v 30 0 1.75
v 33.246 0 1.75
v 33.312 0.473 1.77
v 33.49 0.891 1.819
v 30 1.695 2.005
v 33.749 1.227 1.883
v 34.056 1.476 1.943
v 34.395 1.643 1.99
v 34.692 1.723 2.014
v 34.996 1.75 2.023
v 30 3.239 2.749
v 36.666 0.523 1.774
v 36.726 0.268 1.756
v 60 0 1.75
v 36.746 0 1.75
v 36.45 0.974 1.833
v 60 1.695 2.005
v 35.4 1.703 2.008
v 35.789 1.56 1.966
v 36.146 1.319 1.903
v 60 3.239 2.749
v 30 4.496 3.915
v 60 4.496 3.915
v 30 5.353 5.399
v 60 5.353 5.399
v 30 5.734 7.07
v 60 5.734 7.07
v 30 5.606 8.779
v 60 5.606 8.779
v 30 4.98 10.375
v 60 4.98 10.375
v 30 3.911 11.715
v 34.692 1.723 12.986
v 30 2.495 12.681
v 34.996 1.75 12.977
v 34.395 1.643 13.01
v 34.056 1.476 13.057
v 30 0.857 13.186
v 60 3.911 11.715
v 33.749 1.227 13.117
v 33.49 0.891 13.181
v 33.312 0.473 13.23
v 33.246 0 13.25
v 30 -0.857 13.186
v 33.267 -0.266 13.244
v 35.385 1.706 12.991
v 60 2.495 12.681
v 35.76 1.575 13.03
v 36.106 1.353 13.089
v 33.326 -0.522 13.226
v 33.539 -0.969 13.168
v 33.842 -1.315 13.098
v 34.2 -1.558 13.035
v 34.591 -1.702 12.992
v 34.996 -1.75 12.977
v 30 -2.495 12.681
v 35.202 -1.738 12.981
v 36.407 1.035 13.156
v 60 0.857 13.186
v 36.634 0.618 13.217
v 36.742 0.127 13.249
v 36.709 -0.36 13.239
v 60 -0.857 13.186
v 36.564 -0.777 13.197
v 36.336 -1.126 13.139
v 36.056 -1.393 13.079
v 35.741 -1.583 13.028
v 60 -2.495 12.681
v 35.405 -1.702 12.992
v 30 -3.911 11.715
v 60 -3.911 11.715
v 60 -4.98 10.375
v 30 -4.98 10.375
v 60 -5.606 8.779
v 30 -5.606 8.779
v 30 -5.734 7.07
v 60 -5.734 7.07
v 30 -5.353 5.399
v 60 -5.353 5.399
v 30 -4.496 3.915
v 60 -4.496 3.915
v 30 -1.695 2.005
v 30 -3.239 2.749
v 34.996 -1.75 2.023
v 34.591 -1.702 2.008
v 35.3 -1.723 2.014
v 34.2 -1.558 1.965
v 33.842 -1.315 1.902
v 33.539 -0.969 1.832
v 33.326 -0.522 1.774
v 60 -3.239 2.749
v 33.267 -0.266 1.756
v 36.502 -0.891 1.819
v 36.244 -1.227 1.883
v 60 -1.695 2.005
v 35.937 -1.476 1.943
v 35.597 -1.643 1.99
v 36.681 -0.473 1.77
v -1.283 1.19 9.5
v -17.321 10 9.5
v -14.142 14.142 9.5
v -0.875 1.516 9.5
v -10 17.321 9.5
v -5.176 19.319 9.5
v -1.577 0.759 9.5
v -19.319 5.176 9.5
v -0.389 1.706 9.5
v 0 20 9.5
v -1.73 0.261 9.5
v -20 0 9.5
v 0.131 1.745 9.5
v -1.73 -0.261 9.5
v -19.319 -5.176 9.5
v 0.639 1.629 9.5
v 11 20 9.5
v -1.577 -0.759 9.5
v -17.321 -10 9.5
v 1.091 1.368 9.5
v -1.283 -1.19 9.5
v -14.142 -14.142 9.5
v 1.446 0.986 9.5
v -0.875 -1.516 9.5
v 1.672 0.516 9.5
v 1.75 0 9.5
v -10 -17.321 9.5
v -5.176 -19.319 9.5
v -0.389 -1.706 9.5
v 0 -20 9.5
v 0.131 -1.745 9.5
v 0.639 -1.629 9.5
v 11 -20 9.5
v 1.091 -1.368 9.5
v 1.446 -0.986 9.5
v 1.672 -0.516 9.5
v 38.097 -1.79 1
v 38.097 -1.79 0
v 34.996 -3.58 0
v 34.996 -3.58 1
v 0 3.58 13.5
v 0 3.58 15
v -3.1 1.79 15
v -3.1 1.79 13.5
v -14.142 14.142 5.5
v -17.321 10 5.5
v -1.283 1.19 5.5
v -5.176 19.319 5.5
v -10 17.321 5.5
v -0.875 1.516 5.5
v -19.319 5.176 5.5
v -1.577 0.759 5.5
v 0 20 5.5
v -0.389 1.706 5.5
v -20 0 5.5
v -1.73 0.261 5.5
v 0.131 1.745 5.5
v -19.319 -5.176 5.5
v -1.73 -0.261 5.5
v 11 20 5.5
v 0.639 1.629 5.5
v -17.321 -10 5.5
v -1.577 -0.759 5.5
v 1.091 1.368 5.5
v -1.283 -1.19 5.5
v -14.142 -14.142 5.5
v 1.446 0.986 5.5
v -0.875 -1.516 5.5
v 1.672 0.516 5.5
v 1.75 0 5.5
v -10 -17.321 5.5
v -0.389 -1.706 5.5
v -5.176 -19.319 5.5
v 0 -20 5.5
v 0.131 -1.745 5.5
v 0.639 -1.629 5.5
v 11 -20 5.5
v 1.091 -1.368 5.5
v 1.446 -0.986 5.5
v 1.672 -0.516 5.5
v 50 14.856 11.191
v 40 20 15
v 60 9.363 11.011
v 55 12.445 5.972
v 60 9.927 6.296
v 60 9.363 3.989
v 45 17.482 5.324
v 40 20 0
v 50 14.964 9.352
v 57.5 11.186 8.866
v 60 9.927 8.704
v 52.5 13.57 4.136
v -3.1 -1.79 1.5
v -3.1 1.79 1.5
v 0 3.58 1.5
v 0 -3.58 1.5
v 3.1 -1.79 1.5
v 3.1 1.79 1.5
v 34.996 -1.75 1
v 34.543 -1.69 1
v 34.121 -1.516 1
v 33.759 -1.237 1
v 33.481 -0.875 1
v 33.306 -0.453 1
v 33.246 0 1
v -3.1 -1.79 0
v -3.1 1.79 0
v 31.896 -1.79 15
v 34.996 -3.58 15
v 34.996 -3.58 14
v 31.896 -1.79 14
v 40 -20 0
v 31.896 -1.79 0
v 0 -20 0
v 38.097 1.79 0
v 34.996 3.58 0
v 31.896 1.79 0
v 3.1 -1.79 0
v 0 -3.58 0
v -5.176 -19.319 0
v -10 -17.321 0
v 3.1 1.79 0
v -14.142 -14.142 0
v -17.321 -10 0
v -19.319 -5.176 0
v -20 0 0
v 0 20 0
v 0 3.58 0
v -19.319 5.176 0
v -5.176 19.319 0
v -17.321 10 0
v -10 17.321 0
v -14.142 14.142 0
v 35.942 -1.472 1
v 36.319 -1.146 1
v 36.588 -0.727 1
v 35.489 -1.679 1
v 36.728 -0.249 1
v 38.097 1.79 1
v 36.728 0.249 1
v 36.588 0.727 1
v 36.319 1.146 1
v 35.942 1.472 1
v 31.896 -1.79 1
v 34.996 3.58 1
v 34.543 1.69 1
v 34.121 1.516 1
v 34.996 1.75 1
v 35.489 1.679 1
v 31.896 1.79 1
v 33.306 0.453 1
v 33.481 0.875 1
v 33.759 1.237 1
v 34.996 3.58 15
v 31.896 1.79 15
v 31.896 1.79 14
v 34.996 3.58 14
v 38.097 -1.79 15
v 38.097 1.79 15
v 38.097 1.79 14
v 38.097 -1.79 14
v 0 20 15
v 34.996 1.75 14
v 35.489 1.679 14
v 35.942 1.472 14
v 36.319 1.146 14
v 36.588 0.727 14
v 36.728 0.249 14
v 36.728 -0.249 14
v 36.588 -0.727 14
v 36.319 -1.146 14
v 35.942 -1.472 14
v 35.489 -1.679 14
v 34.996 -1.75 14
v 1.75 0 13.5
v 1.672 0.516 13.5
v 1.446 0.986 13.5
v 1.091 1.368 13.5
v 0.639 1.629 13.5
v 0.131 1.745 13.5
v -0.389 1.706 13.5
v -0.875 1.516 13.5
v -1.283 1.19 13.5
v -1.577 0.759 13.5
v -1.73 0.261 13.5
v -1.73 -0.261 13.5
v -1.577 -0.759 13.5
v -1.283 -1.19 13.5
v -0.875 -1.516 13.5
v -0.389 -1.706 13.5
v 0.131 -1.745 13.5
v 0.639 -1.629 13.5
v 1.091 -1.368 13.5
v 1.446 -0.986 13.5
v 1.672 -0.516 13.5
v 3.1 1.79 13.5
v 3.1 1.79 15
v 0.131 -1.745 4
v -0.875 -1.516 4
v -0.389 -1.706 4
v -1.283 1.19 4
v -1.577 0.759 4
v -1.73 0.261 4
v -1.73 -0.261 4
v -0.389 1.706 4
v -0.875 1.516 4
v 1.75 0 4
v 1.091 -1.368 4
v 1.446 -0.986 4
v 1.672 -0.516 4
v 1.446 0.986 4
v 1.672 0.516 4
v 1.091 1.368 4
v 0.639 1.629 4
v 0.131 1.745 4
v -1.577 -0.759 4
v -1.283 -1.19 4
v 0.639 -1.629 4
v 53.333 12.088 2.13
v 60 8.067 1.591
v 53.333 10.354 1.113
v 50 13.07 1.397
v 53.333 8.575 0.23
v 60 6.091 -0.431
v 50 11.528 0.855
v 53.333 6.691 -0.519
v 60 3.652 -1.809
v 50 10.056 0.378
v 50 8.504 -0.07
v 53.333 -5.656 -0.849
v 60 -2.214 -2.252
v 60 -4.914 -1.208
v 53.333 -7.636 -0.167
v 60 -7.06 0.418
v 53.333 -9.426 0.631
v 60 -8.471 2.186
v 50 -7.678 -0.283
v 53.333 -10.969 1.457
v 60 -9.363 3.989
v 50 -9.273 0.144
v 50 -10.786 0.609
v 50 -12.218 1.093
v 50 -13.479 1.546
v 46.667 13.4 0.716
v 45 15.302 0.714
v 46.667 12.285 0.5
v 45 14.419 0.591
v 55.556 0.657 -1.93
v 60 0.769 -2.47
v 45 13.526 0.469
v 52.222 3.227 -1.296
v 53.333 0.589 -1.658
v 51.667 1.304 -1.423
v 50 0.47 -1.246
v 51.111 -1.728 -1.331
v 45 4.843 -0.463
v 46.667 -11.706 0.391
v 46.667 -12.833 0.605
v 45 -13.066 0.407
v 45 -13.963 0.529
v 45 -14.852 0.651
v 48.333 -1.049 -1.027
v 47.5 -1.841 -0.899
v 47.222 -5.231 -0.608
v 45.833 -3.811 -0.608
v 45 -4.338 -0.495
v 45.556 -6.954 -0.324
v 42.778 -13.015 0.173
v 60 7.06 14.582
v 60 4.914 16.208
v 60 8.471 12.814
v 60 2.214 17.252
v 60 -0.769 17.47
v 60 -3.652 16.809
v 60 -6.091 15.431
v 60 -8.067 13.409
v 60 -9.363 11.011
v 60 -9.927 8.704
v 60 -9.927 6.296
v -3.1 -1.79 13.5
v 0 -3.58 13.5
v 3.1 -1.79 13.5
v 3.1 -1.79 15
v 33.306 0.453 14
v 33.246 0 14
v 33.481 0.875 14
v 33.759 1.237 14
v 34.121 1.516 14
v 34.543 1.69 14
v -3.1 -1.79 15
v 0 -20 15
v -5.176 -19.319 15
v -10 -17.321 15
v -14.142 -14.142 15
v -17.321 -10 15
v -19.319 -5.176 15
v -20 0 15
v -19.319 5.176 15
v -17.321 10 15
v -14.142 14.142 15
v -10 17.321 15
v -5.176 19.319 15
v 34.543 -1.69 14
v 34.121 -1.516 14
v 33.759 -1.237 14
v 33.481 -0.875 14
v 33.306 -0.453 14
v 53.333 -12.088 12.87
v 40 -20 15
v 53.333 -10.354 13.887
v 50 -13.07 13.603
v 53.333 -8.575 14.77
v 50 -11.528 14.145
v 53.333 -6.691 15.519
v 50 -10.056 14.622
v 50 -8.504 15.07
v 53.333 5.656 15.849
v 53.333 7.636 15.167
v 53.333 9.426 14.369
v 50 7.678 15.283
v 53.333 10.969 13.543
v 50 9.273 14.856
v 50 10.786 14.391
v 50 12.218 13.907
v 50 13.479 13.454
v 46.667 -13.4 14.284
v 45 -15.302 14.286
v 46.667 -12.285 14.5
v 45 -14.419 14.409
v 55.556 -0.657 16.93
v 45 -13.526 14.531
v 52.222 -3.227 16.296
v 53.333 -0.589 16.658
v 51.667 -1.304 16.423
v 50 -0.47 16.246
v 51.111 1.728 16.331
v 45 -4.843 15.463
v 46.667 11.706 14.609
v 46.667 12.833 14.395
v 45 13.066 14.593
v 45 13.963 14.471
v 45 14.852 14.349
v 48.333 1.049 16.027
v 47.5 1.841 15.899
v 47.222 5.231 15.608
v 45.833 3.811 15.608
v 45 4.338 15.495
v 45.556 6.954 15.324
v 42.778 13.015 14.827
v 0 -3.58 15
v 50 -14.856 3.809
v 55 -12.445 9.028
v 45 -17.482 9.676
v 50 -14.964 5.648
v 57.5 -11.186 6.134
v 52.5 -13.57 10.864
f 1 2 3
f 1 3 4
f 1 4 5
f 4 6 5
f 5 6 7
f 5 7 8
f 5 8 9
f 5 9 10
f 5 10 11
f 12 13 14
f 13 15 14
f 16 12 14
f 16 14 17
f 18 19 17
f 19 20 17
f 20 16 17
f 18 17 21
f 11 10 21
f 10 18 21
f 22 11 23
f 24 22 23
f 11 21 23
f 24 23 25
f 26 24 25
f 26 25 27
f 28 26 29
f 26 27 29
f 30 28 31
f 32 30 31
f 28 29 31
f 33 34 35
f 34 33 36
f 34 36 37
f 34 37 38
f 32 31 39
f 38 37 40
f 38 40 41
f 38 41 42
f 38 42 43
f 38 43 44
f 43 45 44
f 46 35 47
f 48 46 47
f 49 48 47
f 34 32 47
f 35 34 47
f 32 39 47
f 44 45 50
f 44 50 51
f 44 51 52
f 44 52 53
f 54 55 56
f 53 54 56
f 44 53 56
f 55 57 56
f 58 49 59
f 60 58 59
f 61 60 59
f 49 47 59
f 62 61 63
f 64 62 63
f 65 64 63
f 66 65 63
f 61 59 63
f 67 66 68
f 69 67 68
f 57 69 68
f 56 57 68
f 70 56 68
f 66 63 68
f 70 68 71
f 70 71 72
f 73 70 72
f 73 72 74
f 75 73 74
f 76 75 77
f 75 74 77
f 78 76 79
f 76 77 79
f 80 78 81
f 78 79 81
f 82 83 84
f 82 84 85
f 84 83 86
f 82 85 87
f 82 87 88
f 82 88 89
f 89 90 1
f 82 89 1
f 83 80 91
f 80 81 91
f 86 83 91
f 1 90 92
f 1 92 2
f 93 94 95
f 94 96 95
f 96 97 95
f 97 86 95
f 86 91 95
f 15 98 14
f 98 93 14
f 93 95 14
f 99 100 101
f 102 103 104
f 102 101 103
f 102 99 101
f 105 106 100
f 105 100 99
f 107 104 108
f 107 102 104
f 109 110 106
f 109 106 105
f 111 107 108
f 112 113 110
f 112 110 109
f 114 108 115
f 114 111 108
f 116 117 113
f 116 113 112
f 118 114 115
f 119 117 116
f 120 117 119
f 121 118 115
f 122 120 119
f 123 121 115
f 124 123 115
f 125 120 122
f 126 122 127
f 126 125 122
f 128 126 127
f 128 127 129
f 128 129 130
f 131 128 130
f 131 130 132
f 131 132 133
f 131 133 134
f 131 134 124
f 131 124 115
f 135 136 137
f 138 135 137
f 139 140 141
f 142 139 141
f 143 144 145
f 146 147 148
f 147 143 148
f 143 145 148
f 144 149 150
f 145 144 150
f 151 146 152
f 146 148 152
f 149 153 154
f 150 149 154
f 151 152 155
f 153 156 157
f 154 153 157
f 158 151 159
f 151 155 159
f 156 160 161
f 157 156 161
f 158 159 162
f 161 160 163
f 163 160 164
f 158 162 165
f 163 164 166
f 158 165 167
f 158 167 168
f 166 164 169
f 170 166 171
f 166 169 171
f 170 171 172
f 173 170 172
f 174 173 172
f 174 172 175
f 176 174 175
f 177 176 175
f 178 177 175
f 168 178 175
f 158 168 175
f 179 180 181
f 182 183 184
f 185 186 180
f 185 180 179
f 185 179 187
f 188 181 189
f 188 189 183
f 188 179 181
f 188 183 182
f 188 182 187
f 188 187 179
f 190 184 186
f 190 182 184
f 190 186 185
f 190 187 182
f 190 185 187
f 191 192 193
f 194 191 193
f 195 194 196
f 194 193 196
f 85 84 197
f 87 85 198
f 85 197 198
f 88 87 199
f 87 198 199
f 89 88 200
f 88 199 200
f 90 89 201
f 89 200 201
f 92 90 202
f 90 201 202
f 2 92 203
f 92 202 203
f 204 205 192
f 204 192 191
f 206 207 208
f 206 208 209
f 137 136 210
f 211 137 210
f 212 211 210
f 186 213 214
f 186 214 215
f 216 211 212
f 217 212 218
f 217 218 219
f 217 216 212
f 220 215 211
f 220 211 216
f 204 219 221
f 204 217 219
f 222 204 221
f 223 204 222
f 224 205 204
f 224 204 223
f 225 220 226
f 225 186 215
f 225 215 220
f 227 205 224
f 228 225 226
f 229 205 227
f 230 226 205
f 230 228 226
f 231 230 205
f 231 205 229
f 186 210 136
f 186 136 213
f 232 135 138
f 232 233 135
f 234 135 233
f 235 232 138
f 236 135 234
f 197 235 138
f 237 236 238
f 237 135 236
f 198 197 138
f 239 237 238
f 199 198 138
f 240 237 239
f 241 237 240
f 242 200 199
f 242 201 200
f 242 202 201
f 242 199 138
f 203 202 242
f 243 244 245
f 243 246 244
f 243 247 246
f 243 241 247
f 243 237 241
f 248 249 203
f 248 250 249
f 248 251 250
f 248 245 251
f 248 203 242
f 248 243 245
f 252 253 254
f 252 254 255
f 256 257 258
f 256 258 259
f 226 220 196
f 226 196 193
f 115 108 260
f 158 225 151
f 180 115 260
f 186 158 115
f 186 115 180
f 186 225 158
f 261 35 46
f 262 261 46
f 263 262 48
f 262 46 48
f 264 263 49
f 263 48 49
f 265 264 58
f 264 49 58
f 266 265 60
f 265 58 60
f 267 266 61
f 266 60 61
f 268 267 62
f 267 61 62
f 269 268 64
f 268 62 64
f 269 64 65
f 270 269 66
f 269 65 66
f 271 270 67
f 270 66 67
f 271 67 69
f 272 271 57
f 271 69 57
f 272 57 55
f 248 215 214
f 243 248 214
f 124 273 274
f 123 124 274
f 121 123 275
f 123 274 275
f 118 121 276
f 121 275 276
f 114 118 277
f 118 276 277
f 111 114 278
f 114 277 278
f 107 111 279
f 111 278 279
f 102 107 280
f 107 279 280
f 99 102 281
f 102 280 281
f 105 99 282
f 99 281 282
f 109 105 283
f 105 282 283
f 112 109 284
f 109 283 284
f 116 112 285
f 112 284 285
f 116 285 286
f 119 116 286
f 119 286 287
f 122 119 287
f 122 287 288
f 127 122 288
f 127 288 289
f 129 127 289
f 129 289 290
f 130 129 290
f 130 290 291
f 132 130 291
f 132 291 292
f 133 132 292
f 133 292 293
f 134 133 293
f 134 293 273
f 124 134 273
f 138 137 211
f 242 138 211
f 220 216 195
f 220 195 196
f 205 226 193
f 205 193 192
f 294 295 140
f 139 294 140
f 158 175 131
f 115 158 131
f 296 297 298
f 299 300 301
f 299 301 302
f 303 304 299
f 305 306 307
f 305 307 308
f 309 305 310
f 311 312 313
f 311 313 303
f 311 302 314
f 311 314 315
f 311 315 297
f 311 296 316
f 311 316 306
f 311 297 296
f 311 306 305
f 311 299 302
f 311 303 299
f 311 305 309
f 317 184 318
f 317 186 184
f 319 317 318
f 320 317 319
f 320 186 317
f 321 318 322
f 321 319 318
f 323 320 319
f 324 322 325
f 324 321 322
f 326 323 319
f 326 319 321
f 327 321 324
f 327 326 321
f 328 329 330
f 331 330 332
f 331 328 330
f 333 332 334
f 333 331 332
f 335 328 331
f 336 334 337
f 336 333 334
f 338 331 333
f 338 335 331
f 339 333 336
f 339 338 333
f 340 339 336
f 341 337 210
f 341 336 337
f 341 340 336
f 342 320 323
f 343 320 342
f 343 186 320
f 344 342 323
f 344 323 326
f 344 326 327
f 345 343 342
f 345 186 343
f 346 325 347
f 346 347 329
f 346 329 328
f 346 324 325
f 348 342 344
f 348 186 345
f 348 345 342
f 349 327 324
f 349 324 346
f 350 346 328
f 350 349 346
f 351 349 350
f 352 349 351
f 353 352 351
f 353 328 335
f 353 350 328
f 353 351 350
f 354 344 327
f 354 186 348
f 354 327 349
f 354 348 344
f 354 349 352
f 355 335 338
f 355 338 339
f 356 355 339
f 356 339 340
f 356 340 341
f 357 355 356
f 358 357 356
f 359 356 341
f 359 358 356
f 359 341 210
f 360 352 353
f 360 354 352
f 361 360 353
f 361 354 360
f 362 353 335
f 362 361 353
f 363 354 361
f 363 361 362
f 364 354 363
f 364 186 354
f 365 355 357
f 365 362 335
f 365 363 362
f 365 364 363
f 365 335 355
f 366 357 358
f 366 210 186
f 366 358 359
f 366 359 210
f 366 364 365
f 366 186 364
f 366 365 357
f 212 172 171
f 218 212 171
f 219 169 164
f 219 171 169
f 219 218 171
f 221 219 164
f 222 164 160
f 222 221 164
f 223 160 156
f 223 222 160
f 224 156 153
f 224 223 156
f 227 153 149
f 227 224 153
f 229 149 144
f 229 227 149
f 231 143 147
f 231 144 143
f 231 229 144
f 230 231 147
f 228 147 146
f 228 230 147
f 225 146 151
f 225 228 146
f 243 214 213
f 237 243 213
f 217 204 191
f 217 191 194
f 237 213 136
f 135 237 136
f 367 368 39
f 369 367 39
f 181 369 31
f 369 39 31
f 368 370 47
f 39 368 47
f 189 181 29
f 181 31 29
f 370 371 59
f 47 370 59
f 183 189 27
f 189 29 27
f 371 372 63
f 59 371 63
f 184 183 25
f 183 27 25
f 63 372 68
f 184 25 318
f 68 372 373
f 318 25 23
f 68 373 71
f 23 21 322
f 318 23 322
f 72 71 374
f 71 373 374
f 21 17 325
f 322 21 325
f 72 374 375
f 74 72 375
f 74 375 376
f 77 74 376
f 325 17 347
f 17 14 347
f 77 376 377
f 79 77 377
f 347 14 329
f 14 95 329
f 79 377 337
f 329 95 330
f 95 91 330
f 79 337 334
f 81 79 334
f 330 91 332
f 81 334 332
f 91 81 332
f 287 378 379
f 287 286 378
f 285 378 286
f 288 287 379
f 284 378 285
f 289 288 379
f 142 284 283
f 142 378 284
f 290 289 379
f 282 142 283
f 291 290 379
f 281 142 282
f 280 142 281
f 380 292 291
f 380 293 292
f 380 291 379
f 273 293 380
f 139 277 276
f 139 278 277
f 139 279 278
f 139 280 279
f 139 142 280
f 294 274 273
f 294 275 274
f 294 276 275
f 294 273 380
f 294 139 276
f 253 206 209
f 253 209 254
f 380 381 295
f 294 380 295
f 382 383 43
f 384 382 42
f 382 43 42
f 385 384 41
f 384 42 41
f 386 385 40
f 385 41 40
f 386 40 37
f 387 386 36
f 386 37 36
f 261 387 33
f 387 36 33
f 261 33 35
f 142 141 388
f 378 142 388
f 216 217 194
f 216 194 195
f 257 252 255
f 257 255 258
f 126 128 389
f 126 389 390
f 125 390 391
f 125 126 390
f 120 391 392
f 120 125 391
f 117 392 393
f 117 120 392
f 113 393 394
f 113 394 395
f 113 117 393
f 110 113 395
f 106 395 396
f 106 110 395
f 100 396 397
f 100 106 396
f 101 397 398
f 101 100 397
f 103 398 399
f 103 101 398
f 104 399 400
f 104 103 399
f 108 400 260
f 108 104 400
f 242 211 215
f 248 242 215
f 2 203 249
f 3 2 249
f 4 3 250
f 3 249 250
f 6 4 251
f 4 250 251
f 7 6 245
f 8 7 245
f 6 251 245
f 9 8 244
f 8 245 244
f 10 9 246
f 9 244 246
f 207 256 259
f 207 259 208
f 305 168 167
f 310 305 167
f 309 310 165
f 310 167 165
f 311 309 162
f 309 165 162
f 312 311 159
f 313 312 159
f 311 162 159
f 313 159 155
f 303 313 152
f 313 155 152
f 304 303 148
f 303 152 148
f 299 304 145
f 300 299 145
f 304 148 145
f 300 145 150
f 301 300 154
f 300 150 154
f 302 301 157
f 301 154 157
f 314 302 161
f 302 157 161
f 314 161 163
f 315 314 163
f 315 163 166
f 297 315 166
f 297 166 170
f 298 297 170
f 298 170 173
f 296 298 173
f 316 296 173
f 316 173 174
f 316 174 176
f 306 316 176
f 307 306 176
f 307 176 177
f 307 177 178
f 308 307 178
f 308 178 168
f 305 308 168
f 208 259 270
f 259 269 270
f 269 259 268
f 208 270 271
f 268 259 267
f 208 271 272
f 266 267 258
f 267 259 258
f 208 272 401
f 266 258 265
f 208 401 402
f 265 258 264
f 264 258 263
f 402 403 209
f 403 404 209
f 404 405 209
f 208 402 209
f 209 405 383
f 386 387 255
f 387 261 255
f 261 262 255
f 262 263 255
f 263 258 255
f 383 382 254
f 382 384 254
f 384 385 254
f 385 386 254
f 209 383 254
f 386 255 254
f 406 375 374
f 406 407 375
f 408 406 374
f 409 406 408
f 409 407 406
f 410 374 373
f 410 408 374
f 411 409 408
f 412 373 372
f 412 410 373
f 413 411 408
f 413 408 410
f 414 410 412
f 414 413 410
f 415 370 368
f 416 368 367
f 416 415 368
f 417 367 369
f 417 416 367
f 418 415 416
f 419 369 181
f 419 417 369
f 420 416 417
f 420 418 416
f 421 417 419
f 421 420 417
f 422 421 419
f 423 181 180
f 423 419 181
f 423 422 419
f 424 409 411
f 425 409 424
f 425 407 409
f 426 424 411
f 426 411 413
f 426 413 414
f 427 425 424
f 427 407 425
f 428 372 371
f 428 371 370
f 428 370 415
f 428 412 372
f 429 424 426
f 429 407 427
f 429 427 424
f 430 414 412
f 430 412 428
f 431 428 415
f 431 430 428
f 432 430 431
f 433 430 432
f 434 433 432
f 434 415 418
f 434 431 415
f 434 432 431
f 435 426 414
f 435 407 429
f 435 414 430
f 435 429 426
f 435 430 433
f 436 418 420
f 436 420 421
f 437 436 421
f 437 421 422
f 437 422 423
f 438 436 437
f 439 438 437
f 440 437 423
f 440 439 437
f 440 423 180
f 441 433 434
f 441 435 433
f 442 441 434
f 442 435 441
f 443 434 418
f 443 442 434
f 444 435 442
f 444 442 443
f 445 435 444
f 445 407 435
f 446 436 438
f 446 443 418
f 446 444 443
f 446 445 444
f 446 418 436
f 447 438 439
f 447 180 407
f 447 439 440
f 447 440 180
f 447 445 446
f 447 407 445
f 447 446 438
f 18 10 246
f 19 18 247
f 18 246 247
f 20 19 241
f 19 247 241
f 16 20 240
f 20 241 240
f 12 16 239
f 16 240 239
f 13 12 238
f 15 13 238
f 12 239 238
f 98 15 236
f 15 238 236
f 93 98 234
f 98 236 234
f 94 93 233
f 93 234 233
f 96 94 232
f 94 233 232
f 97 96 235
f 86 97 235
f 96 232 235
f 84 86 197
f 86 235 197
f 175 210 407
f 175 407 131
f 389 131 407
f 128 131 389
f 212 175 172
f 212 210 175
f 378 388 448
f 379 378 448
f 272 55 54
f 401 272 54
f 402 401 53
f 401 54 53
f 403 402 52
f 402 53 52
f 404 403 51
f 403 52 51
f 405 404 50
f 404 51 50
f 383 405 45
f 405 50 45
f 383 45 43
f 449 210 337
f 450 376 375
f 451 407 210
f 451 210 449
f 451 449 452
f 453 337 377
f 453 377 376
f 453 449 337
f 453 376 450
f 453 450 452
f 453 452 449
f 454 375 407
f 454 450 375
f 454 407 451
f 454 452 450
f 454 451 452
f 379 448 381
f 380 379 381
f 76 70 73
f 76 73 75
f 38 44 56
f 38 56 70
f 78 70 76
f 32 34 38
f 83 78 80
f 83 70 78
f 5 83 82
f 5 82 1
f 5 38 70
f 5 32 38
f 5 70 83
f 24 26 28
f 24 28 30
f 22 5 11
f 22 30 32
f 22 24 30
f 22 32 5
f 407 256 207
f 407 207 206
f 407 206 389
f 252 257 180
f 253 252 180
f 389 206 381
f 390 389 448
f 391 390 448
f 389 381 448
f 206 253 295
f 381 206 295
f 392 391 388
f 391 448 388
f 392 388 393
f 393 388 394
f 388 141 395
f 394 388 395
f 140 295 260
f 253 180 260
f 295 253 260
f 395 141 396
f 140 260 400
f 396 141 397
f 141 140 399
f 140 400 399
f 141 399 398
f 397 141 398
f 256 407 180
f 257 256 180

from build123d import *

# Parameters (mm, degrees)
BOSS_EXTRUDE1_DEPTH = 15
CUT_EXTRUDE1_DEPTH  = 1.5
SKETCH3_R           = 1.75
CUT_EXTRUDE2_DEPTH  = 9.5
SKETCH5_W           = 31
SKETCH5_H           = 4
CUT_EXTRUDE3_DEPTH  = 54.5
SKETCH9_R           = 5.75
CUT_EXTRUDE6_DEPTH  = 30
CUT_EXTRUDE7_DEPTH  = 1
CUT_EXTRUDE8_DEPTH  = 36


with BuildPart() as part:
    # Sketch1 → Boss-Extrude1 (new body)
    with BuildSketch(Plane.XY):
        with BuildLine():
            Line((0, 20), (40, 20))
            Line((40, 20), (40, -20))
            Line((40, -20), (0, -20))
            ThreePointArc((0, -20), (-20, 0), (0, 20))
        make_face()
    extrude(amount=BOSS_EXTRUDE1_DEPTH)

    # Sketch2 → Cut-Extrude1 (cut)
    with BuildSketch(Plane.XY.offset(15)):
        Polygon((0, 3.58), (-3.100370946, 1.79), (-3.100370946, -1.79), (0, -3.58), (3.100370946, -1.79), (3.100370946, 1.79), align=None)
    cut_extrude1 = extrude(amount=-CUT_EXTRUDE1_DEPTH, mode=Mode.SUBTRACT)

    # Mirror1: Cut-Extrude1 across plane
    add(cut_extrude1.mirror(Plane.XY.offset(7.5)), mode=Mode.SUBTRACT)

    # Sketch3 → Cut-Extrude2 (cut)
    with BuildSketch(Plane.XY.offset(13.5)):
        Circle(SKETCH3_R)
    extrude(amount=-CUT_EXTRUDE2_DEPTH, mode=Mode.SUBTRACT)

    # Sketch5 → Cut-Extrude3 (cut)
    with BuildSketch(Plane.XZ.offset(20)):
        with Locations((-4.5, 7.5)):
            Rectangle(SKETCH5_W, SKETCH5_H)
    extrude(amount=-CUT_EXTRUDE3_DEPTH, mode=Mode.SUBTRACT)

    # Loft2: read off the stored shape, not the designer's step
    # Loft2: loft between two sections, ruled curve by curve
    loft2_from = [
        Edge.make_bspline([(60, 9.363291776, 3.988765584), (60, 9.089319173, 3.258171977), (60, 8.706678231, 2.497933469), (60, 7.661601681, 1.009485762), (60, 6.997280046, 0.281867871), (60, 5.377038752, -0.99416351), (60, 4.420018042, -1.539958552), (60, 2.836034453, -2.105793102), (60, 2.284258254, -2.252472584), (60, 1.154936709, -2.449606951), (60, 0.57750039, -2.5), (60, -0.57750039, -2.5), (60, -1.154936709, -2.449606951), (60, -2.284258254, -2.252472584), (60, -2.836034453, -2.105793102), (60, -4.420018042, -1.539958552), (60, -5.377038752, -0.99416351), (60, -6.997280046, 0.281867871), (60, -7.661601681, 1.009485762), (60, -8.706678231, 2.497933469), (60, -9.089319173, 3.258171977), (60, -9.363291776, 3.988765584)], [0, 0, 0, 0, 0.125, 0.125, 0.25, 0.25, 0.375, 0.375, 0.4375, 0.4375, 0.5, 0.5, 0.5625, 0.5625, 0.625, 0.625, 0.75, 0.75, 0.875, 0.875, 1, 1, 1, 1], 3),
        Edge.make_bspline([(60, -9.363291776, 3.988765584), (60, -9.568771228, 4.53671079), (60, -9.729102032, 5.111695552), (60, -9.944756725, 6.291183156), (60, -10, 6.895551394), (60, -10, 8.104448606), (60, -9.944756725, 8.708816844), (60, -9.729102032, 9.888304448), (60, -9.568771228, 10.46328921), (60, -9.363291776, 11.011234416)], [0, 0, 0, 0, 0.25, 0.25, 0.5, 0.5, 0.75, 0.75, 1, 1, 1, 1], 3),
        Edge.make_bspline([(60, 9.363291776, 11.011234416), (60, 9.568771228, 10.46328921), (60, 9.729102032, 9.888304448), (60, 9.944756725, 8.708816844), (60, 10, 8.104448606), (60, 10, 6.895551394), (60, 9.944756725, 6.291183156), (60, 9.729102032, 5.111695552), (60, 9.568771228, 4.53671079), (60, 9.363291776, 3.988765584)], [0, 0, 0, 0, 0.25, 0.25, 0.5, 0.5, 0.75, 0.75, 1, 1, 1, 1], 3),
        Edge.make_bspline([(60, -9.363291776, 11.011234416), (60, -9.089319173, 11.741828023), (60, -8.706678231, 12.502066531), (60, -7.661601681, 13.990514238), (60, -6.997280046, 14.718132129), (60, -5.377038752, 15.99416351), (60, -4.420018042, 16.539958552), (60, -2.836034453, 17.105793102), (60, -2.284258254, 17.252472584), (60, -1.154936709, 17.449606951), (60, -0.57750039, 17.5), (60, 0.57750039, 17.5), (60, 1.154936709, 17.449606951), (60, 2.284258254, 17.252472584), (60, 2.836034453, 17.105793102), (60, 4.420018042, 16.539958552), (60, 5.377038752, 15.99416351), (60, 6.997280046, 14.718132129), (60, 7.661601681, 13.990514238), (60, 8.706678231, 12.502066531), (60, 9.089319173, 11.741828023), (60, 9.363291776, 11.011234416)], [0, 0, 0, 0, 0.125, 0.125, 0.25, 0.25, 0.375, 0.375, 0.4375, 0.4375, 0.5, 0.5, 0.5625, 0.5625, 0.625, 0.625, 0.75, 0.75, 0.875, 0.875, 1, 1, 1, 1], 3),
    ]
    loft2_to = [
        Edge.make_bspline([(40, 20, 0), (40, 18.333333333, 0), (40, 16.666666667, 0), (40, 13.333333333, 0), (40, 11.666666667, 0), (40, 8.333333333, 0), (40, 6.666666667, 0), (40, 4.166666667, 0), (40, 3.333333333, 0), (40, 1.666666667, 0), (40, 0.833333333, 0), (40, -0.833333333, 0), (40, -1.666666667, 0), (40, -3.333333333, 0), (40, -4.166666667, 0), (40, -6.666666667, 0), (40, -8.333333333, 0), (40, -11.666666667, 0), (40, -13.333333333, 0), (40, -16.666666667, 0), (40, -18.333333333, 0), (40, -20, 0)], [0, 0, 0, 0, 0.125, 0.125, 0.25, 0.25, 0.375, 0.375, 0.4375, 0.4375, 0.5, 0.5, 0.5625, 0.5625, 0.625, 0.625, 0.75, 0.75, 0.875, 0.875, 1, 1, 1, 1], 3),
        Edge.make_bspline([(40, -20, 0), (40, -20, 1.25), (40, -20, 2.5), (40, -20, 5), (40, -20, 6.25), (40, -20, 8.75), (40, -20, 10), (40, -20, 12.5), (40, -20, 13.75), (40, -20, 15)], [0, 0, 0, 0, 0.25, 0.25, 0.5, 0.5, 0.75, 0.75, 1, 1, 1, 1], 3),
        Edge.make_bspline([(40, 20, 15), (40, 20, 13.75), (40, 20, 12.5), (40, 20, 10), (40, 20, 8.75), (40, 20, 6.25), (40, 20, 5), (40, 20, 2.5), (40, 20, 1.25), (40, 20, 0)], [0, 0, 0, 0, 0.25, 0.25, 0.5, 0.5, 0.75, 0.75, 1, 1, 1, 1], 3),
        Edge.make_bspline([(40, -20, 15), (40, -18.333333333, 15), (40, -16.666666667, 15), (40, -13.333333333, 15), (40, -11.666666667, 15), (40, -8.333333333, 15), (40, -6.666666667, 15), (40, -4.166666667, 15), (40, -3.333333333, 15), (40, -1.666666667, 15), (40, -0.833333333, 15), (40, 0.833333333, 15), (40, 1.666666667, 15), (40, 3.333333333, 15), (40, 4.166666667, 15), (40, 6.666666667, 15), (40, 8.333333333, 15), (40, 11.666666667, 15), (40, 13.333333333, 15), (40, 16.666666667, 15), (40, 18.333333333, 15), (40, 20, 15)], [0, 0, 0, 0, 0.125, 0.125, 0.25, 0.25, 0.375, 0.375, 0.4375, 0.4375, 0.5, 0.5, 0.5625, 0.5625, 0.625, 0.625, 0.75, 0.75, 0.875, 0.875, 1, 1, 1, 1], 3),
    ]
    loft2 = Solid(Shell([*[Face.make_surface_from_curves(loft2_from[k], loft2_to[k]) for k in range(4)], Face(Wire(loft2_from)), Face(Wire(loft2_to))]))
    add(loft2)

    # Sketch9 → Cut-Extrude6 (cut)
    with BuildSketch(Plane(origin=(60, 0, 0), x_dir=(0, 0, -1), z_dir=(1, 0, 0))):
        with Locations((-7.5, 0)):
            Circle(SKETCH9_R)
    extrude(amount=-CUT_EXTRUDE6_DEPTH, mode=Mode.SUBTRACT)

    # Sketch10 → Cut-Extrude7 (cut)
    with BuildSketch(Plane(origin=(0, 0, 0), x_dir=(-1, 0, 0), z_dir=(0, 0, -1))):
        Polygon((-34.996252953, 3.58), (-38.096623899, 1.79), (-38.096623899, -1.79), (-34.996252953, -3.58), (-31.895882008, -1.79), (-31.895882008, 1.79), align=None)
    cut_extrude7 = extrude(amount=-CUT_EXTRUDE7_DEPTH, mode=Mode.SUBTRACT)

    # Mirror4: Cut-Extrude7 across plane
    add(cut_extrude7.mirror(Plane.XY.offset(7.5)), mode=Mode.SUBTRACT)

    # Sketch11 → Cut-Extrude8 (cut)
    with BuildSketch(Plane(origin=(0, 0, 1), x_dir=(-1, 0, 0), z_dir=(0, 0, -1))):
        with BuildLine():
            ThreePointArc((-33.246252953, 0), (-33.758816086, 1.237436867), (-34.996252953, 1.75))
            Line((-34.996252953, 1.75), (-34.996252953, -1.75))
            ThreePointArc((-34.996252953, -1.75), (-33.758816086, -1.237436867), (-33.246252953, 0))
        make_face()
        with BuildLine():
            Line((-34.996252953, -1.75), (-34.996252953, 1.75))
            ThreePointArc((-34.996252953, 1.75), (-36.746252953, 0), (-34.996252953, -1.75))
        make_face()
    extrude(amount=-CUT_EXTRUDE8_DEPTH, mode=Mode.SUBTRACT)


solid = part.part
